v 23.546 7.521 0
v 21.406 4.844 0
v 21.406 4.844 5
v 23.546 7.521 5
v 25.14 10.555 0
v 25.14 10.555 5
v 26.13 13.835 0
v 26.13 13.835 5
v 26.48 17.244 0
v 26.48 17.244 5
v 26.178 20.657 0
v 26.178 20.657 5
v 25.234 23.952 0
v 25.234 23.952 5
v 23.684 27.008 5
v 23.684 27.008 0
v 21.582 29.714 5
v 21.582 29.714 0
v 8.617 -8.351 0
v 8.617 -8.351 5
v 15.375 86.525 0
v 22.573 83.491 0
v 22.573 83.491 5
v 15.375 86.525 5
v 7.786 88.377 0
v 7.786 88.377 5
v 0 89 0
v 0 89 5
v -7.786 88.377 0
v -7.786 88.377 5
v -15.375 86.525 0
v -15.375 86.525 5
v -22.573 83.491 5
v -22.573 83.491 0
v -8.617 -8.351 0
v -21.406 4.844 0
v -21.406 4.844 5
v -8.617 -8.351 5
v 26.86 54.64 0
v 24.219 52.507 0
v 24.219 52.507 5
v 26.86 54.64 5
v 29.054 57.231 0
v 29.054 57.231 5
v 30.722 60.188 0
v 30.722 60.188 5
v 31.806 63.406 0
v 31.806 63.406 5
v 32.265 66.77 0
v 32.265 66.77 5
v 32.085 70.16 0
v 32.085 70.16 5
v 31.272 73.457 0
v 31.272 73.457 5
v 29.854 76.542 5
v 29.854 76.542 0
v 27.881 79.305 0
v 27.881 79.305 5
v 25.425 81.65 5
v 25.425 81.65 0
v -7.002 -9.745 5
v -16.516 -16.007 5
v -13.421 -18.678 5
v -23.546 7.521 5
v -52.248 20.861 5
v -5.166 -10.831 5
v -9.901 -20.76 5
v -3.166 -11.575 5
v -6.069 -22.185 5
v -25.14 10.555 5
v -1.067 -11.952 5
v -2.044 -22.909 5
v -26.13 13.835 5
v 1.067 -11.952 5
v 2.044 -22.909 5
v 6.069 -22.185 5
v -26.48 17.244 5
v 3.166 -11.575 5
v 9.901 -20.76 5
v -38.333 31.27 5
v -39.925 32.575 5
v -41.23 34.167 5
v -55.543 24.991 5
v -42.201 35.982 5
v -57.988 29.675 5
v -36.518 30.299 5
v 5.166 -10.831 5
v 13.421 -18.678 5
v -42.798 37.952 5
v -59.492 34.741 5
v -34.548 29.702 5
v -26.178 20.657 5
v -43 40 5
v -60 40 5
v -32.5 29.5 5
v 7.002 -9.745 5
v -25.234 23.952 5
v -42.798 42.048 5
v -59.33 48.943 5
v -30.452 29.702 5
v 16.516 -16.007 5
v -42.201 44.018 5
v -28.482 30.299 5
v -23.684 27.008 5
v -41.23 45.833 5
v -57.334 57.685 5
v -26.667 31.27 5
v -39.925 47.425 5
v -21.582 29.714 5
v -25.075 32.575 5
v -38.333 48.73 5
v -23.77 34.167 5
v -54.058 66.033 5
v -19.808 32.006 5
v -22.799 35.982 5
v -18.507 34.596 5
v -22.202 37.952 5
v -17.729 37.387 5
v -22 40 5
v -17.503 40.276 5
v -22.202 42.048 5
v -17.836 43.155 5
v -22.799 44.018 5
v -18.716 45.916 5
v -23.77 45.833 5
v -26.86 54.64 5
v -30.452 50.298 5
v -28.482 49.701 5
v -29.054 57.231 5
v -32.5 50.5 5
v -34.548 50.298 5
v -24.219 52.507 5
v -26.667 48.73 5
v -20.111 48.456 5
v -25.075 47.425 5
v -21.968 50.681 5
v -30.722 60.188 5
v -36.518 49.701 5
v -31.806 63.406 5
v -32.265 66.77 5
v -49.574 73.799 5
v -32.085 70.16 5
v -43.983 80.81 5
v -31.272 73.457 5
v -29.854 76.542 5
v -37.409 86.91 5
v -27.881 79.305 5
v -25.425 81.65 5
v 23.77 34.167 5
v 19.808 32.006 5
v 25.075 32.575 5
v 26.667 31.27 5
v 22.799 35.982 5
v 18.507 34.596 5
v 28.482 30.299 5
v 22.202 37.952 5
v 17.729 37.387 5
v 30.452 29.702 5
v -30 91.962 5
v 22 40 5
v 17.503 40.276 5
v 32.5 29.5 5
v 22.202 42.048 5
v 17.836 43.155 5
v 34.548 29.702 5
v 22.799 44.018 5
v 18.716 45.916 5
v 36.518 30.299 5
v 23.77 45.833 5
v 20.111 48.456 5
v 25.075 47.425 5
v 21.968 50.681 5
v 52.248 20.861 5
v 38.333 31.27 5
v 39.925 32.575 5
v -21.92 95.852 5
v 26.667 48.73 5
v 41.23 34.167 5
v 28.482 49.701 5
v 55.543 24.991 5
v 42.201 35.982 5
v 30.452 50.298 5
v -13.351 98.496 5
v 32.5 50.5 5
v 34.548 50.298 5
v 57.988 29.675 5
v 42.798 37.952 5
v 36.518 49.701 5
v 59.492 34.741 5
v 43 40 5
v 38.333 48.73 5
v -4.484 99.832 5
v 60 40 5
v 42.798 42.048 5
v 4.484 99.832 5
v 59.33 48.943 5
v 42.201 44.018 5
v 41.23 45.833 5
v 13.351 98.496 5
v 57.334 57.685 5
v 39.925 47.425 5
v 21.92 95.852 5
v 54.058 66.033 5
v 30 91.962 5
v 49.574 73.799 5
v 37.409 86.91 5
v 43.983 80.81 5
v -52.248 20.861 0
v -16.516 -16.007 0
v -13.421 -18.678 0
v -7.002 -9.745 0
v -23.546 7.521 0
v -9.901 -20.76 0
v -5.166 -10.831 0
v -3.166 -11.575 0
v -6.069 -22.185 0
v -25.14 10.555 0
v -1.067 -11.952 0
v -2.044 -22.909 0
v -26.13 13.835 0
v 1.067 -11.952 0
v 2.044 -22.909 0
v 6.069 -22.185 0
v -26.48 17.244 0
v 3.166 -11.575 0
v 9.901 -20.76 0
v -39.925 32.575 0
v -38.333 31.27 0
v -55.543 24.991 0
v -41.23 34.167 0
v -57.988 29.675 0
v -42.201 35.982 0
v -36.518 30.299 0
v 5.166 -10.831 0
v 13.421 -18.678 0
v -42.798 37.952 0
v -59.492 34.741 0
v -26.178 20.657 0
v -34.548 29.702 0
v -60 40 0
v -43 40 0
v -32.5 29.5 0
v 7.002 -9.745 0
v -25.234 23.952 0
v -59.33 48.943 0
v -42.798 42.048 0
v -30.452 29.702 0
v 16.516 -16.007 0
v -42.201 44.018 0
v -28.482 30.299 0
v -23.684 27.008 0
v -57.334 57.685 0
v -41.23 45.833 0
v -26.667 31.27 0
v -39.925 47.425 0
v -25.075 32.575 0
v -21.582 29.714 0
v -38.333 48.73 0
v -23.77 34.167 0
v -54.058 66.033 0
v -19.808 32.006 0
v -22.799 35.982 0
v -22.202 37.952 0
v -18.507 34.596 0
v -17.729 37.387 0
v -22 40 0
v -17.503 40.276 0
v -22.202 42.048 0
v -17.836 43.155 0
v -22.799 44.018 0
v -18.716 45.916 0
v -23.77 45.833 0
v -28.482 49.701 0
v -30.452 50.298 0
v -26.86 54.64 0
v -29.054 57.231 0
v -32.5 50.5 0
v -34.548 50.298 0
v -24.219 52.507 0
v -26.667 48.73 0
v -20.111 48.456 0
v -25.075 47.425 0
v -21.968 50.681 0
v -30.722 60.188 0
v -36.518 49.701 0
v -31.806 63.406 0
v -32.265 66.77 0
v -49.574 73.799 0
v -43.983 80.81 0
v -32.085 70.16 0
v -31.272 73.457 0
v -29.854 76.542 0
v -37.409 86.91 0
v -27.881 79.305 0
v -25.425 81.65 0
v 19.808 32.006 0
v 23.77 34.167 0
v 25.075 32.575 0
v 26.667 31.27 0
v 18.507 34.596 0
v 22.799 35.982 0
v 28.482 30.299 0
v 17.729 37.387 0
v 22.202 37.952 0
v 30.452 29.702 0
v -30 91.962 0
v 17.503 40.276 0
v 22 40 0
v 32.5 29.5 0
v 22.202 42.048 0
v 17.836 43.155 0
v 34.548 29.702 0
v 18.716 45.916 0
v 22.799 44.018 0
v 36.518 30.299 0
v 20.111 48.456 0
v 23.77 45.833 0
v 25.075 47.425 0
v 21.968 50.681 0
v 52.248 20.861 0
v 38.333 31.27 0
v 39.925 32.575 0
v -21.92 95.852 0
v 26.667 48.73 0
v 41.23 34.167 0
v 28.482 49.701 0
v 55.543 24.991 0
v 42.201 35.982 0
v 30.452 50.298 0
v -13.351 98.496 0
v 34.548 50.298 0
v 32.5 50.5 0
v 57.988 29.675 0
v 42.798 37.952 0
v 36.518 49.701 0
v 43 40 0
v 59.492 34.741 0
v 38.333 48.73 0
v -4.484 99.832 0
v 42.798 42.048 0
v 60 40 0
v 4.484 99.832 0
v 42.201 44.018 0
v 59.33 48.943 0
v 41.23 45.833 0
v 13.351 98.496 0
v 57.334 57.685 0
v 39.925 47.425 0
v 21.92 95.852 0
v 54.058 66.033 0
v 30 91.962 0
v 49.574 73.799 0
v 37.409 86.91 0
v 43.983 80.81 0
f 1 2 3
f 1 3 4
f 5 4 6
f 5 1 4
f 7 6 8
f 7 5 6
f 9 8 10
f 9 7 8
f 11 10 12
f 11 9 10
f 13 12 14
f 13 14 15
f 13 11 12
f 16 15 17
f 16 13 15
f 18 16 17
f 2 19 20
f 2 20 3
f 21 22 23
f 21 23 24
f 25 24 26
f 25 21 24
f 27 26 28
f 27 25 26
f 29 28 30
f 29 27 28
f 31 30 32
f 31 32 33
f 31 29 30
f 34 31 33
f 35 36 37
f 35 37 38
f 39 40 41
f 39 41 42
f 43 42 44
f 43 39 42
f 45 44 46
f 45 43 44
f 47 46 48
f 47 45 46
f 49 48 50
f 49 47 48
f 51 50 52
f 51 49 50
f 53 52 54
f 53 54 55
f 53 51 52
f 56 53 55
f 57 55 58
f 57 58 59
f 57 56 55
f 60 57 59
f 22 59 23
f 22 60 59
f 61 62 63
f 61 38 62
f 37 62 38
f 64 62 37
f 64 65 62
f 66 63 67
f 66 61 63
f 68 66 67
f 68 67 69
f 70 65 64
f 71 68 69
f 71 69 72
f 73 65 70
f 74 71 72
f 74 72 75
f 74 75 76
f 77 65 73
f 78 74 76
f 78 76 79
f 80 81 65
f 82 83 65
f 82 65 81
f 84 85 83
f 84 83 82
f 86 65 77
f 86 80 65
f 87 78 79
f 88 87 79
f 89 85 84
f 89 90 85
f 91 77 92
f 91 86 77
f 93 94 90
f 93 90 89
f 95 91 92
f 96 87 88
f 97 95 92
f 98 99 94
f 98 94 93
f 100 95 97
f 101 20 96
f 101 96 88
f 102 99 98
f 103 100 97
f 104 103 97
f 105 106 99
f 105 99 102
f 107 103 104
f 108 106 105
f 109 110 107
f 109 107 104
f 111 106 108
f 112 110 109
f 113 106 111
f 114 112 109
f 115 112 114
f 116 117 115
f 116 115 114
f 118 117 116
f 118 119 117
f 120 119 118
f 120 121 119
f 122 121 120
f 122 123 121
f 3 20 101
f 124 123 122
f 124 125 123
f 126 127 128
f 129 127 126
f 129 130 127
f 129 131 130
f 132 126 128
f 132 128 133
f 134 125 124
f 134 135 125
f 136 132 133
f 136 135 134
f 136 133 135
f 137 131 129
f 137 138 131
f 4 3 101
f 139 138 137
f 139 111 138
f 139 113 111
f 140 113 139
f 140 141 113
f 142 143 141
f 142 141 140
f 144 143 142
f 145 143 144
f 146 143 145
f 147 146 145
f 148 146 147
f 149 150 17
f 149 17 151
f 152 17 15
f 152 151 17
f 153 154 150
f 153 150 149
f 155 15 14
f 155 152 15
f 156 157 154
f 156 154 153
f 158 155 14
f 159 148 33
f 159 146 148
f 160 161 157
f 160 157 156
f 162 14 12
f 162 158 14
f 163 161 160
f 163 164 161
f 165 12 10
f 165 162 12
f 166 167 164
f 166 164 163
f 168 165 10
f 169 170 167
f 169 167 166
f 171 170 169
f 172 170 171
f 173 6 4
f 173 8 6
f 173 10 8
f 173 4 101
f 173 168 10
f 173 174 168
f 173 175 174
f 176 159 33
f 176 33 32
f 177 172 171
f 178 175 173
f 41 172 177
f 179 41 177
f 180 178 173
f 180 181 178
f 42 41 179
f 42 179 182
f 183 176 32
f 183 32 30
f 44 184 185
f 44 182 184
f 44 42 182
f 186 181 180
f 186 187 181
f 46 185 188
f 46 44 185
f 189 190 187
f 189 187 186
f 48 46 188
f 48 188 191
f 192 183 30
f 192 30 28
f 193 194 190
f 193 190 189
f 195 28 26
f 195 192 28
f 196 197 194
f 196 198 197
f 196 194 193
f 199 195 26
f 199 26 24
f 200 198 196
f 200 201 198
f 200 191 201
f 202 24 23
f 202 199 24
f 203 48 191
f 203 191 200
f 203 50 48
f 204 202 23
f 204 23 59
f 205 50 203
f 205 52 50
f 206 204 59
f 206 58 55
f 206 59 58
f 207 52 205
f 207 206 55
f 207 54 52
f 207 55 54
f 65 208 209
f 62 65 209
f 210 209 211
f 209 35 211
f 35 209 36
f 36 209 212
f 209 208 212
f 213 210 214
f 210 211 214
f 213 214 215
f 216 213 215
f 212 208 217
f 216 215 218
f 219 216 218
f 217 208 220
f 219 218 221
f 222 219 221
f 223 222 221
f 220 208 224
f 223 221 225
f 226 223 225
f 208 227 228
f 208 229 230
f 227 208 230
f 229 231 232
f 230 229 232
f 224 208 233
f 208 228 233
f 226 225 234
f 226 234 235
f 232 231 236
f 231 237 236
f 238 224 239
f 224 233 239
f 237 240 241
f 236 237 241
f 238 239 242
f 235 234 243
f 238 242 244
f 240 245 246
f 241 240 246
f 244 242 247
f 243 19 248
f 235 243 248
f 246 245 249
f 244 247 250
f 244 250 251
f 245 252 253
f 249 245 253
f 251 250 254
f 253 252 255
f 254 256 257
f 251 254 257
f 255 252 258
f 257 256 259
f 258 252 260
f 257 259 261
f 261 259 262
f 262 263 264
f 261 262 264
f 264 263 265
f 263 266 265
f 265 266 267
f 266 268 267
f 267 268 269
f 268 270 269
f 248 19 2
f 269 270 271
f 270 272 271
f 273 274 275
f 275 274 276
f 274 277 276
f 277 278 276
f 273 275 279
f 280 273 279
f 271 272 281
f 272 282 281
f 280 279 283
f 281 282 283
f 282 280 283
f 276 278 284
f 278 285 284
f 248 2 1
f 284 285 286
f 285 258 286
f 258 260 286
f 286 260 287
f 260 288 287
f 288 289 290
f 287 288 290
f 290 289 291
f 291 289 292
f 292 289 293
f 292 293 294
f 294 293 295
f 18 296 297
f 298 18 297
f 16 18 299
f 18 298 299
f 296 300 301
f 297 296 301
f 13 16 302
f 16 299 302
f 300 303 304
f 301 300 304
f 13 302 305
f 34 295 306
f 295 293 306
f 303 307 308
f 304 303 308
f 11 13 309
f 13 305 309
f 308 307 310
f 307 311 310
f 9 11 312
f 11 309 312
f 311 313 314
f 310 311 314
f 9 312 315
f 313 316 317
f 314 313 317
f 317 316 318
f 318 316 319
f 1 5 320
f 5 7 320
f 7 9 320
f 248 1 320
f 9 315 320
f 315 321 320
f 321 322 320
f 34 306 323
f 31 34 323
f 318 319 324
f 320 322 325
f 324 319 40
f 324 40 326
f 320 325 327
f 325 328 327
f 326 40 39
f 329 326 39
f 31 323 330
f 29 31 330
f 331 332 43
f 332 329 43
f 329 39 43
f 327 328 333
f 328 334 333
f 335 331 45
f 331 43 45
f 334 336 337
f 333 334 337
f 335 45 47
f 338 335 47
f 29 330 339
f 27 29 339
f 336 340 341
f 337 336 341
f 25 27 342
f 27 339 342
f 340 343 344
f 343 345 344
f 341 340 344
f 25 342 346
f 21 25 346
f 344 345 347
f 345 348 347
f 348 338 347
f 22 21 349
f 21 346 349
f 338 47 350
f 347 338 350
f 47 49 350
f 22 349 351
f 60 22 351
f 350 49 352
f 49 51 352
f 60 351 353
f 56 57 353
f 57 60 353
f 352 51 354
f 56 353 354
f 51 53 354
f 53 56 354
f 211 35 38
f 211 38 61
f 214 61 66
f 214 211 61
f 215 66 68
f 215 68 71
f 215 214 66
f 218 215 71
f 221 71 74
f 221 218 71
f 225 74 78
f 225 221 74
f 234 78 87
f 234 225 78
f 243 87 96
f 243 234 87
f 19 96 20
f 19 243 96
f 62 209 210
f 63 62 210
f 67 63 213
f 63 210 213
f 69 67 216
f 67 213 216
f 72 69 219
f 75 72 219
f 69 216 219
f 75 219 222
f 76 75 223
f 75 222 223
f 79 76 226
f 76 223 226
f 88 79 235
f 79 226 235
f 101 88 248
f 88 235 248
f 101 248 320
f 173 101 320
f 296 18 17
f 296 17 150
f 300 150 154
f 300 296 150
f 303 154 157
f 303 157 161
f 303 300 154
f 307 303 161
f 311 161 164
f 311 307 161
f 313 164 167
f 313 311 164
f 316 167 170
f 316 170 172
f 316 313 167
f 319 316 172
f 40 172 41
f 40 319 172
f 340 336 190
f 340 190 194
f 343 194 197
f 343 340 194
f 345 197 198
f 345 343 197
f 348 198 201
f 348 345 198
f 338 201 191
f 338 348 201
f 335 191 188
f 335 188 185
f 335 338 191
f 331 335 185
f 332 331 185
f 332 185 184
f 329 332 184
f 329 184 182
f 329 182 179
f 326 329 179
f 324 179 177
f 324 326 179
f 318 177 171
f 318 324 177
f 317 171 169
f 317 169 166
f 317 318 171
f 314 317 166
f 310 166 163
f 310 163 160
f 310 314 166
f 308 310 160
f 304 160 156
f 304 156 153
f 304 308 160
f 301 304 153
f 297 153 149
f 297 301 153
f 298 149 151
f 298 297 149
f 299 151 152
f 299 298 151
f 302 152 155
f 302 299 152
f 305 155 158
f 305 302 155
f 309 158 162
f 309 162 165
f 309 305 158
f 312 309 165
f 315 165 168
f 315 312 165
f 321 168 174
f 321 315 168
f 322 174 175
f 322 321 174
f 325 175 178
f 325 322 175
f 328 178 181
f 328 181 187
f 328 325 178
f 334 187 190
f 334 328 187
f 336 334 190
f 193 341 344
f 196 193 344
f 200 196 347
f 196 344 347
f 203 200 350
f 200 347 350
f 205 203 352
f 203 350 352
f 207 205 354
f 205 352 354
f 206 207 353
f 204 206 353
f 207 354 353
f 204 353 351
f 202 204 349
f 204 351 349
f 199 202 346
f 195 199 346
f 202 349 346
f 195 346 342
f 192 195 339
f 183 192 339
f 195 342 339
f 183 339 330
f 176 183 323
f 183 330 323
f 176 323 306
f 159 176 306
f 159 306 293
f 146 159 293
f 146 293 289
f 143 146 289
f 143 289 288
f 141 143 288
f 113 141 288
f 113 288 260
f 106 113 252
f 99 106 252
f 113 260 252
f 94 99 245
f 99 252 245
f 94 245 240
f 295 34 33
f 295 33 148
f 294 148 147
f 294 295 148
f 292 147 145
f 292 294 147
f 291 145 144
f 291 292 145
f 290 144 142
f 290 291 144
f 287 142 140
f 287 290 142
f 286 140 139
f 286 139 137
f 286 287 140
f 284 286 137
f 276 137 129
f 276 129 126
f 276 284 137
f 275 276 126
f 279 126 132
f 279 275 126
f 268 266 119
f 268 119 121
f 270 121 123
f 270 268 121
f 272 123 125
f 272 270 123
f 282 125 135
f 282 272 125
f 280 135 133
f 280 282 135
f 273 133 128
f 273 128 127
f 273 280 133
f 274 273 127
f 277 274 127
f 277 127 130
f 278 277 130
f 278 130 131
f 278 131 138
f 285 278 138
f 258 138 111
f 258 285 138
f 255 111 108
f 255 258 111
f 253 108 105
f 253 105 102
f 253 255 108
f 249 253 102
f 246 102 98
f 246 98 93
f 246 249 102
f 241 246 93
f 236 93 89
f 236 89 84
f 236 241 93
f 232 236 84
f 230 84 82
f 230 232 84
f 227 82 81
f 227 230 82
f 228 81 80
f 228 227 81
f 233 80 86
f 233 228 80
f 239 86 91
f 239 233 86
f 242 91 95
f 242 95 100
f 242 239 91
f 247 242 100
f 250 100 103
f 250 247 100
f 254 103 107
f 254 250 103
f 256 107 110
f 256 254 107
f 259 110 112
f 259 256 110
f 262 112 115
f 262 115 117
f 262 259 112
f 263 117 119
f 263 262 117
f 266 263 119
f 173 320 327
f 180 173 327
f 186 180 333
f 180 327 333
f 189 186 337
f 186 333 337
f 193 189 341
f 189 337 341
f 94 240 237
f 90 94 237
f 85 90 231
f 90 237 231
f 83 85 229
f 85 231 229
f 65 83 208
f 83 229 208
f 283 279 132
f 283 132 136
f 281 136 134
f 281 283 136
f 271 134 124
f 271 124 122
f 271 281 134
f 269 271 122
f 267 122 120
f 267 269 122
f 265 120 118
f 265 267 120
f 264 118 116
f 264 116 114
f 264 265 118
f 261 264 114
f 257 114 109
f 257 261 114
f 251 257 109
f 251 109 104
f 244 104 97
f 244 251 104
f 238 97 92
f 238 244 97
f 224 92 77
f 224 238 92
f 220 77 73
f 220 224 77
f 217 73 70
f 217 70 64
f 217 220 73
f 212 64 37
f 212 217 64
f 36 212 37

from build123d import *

# Parameters (mm, degrees)
SKETCH2_R           = 10.5
BOSS_EXTRUDE1_DEPTH = 5


with BuildPart() as part:
    # Sketch2 → Boss-Extrude1 (new body)
    with BuildSketch(Plane.XY):
        with BuildLine():
            ThreePointArc((60, 40), (0, 100), (-60, 40))
            ThreePointArc((-60, 40), (-57.988295689, 29.675428199), (-52.2475067, 20.861400806))
            Line((-52.2475067, 20.861400806), (-16.516096513, -16.006828417))
            ThreePointArc((-16.516096513, -16.006828417), (0, -23), (16.516096513, -16.006828417))
            Line((16.516096513, -16.006828417), (52.2475067, 20.861400806))
            ThreePointArc((52.2475067, 20.861400806), (57.988295689, 29.675428199), (60, 40))
        make_face()
        with Locations((32.5, 40)):
            Circle(SKETCH2_R, mode=Mode.SUBTRACT)
        with Locations((-32.5, 40)):
            Circle(SKETCH2_R, mode=Mode.SUBTRACT)
        with BuildLine():
            ThreePointArc((-22.572828784, 83.491003675), (-32.255432897, 68.469423949), (-24.218531469, 52.506689369))
            ThreePointArc((-24.218531469, 52.506689369), (-17.599364702, 41.723678544), (-21.581946383, 29.714276632))
            ThreePointArc((-21.581946383, 29.714276632), (-26.479831206, 17.244012068), (-21.405922791, 4.844325481))
            Line((-21.405922791, 4.844325481), (-8.617093833, -8.351388739))
            ThreePointArc((-8.617093833, -8.351388739), (0, -12), (8.617093833, -8.351388739))
            Line((8.617093833, -8.351388739), (21.405922791, 4.844325481))
            ThreePointArc((21.405922791, 4.844325481), (26.479831206, 17.244012068), (21.581946383, 29.714276632))
            ThreePointArc((21.581946383, 29.714276632), (17.599364702, 41.723678544), (24.218531469, 52.506689369))
            ThreePointArc((24.218531469, 52.506689369), (32.255432897, 68.469423949), (22.572828784, 83.491003675))
            ThreePointArc((22.572828784, 83.491003675), (0, 89), (-22.572828784, 83.491003675))
        make_face(mode=Mode.SUBTRACT)
    extrude(amount=BOSS_EXTRUDE1_DEPTH)


solid = part.part
